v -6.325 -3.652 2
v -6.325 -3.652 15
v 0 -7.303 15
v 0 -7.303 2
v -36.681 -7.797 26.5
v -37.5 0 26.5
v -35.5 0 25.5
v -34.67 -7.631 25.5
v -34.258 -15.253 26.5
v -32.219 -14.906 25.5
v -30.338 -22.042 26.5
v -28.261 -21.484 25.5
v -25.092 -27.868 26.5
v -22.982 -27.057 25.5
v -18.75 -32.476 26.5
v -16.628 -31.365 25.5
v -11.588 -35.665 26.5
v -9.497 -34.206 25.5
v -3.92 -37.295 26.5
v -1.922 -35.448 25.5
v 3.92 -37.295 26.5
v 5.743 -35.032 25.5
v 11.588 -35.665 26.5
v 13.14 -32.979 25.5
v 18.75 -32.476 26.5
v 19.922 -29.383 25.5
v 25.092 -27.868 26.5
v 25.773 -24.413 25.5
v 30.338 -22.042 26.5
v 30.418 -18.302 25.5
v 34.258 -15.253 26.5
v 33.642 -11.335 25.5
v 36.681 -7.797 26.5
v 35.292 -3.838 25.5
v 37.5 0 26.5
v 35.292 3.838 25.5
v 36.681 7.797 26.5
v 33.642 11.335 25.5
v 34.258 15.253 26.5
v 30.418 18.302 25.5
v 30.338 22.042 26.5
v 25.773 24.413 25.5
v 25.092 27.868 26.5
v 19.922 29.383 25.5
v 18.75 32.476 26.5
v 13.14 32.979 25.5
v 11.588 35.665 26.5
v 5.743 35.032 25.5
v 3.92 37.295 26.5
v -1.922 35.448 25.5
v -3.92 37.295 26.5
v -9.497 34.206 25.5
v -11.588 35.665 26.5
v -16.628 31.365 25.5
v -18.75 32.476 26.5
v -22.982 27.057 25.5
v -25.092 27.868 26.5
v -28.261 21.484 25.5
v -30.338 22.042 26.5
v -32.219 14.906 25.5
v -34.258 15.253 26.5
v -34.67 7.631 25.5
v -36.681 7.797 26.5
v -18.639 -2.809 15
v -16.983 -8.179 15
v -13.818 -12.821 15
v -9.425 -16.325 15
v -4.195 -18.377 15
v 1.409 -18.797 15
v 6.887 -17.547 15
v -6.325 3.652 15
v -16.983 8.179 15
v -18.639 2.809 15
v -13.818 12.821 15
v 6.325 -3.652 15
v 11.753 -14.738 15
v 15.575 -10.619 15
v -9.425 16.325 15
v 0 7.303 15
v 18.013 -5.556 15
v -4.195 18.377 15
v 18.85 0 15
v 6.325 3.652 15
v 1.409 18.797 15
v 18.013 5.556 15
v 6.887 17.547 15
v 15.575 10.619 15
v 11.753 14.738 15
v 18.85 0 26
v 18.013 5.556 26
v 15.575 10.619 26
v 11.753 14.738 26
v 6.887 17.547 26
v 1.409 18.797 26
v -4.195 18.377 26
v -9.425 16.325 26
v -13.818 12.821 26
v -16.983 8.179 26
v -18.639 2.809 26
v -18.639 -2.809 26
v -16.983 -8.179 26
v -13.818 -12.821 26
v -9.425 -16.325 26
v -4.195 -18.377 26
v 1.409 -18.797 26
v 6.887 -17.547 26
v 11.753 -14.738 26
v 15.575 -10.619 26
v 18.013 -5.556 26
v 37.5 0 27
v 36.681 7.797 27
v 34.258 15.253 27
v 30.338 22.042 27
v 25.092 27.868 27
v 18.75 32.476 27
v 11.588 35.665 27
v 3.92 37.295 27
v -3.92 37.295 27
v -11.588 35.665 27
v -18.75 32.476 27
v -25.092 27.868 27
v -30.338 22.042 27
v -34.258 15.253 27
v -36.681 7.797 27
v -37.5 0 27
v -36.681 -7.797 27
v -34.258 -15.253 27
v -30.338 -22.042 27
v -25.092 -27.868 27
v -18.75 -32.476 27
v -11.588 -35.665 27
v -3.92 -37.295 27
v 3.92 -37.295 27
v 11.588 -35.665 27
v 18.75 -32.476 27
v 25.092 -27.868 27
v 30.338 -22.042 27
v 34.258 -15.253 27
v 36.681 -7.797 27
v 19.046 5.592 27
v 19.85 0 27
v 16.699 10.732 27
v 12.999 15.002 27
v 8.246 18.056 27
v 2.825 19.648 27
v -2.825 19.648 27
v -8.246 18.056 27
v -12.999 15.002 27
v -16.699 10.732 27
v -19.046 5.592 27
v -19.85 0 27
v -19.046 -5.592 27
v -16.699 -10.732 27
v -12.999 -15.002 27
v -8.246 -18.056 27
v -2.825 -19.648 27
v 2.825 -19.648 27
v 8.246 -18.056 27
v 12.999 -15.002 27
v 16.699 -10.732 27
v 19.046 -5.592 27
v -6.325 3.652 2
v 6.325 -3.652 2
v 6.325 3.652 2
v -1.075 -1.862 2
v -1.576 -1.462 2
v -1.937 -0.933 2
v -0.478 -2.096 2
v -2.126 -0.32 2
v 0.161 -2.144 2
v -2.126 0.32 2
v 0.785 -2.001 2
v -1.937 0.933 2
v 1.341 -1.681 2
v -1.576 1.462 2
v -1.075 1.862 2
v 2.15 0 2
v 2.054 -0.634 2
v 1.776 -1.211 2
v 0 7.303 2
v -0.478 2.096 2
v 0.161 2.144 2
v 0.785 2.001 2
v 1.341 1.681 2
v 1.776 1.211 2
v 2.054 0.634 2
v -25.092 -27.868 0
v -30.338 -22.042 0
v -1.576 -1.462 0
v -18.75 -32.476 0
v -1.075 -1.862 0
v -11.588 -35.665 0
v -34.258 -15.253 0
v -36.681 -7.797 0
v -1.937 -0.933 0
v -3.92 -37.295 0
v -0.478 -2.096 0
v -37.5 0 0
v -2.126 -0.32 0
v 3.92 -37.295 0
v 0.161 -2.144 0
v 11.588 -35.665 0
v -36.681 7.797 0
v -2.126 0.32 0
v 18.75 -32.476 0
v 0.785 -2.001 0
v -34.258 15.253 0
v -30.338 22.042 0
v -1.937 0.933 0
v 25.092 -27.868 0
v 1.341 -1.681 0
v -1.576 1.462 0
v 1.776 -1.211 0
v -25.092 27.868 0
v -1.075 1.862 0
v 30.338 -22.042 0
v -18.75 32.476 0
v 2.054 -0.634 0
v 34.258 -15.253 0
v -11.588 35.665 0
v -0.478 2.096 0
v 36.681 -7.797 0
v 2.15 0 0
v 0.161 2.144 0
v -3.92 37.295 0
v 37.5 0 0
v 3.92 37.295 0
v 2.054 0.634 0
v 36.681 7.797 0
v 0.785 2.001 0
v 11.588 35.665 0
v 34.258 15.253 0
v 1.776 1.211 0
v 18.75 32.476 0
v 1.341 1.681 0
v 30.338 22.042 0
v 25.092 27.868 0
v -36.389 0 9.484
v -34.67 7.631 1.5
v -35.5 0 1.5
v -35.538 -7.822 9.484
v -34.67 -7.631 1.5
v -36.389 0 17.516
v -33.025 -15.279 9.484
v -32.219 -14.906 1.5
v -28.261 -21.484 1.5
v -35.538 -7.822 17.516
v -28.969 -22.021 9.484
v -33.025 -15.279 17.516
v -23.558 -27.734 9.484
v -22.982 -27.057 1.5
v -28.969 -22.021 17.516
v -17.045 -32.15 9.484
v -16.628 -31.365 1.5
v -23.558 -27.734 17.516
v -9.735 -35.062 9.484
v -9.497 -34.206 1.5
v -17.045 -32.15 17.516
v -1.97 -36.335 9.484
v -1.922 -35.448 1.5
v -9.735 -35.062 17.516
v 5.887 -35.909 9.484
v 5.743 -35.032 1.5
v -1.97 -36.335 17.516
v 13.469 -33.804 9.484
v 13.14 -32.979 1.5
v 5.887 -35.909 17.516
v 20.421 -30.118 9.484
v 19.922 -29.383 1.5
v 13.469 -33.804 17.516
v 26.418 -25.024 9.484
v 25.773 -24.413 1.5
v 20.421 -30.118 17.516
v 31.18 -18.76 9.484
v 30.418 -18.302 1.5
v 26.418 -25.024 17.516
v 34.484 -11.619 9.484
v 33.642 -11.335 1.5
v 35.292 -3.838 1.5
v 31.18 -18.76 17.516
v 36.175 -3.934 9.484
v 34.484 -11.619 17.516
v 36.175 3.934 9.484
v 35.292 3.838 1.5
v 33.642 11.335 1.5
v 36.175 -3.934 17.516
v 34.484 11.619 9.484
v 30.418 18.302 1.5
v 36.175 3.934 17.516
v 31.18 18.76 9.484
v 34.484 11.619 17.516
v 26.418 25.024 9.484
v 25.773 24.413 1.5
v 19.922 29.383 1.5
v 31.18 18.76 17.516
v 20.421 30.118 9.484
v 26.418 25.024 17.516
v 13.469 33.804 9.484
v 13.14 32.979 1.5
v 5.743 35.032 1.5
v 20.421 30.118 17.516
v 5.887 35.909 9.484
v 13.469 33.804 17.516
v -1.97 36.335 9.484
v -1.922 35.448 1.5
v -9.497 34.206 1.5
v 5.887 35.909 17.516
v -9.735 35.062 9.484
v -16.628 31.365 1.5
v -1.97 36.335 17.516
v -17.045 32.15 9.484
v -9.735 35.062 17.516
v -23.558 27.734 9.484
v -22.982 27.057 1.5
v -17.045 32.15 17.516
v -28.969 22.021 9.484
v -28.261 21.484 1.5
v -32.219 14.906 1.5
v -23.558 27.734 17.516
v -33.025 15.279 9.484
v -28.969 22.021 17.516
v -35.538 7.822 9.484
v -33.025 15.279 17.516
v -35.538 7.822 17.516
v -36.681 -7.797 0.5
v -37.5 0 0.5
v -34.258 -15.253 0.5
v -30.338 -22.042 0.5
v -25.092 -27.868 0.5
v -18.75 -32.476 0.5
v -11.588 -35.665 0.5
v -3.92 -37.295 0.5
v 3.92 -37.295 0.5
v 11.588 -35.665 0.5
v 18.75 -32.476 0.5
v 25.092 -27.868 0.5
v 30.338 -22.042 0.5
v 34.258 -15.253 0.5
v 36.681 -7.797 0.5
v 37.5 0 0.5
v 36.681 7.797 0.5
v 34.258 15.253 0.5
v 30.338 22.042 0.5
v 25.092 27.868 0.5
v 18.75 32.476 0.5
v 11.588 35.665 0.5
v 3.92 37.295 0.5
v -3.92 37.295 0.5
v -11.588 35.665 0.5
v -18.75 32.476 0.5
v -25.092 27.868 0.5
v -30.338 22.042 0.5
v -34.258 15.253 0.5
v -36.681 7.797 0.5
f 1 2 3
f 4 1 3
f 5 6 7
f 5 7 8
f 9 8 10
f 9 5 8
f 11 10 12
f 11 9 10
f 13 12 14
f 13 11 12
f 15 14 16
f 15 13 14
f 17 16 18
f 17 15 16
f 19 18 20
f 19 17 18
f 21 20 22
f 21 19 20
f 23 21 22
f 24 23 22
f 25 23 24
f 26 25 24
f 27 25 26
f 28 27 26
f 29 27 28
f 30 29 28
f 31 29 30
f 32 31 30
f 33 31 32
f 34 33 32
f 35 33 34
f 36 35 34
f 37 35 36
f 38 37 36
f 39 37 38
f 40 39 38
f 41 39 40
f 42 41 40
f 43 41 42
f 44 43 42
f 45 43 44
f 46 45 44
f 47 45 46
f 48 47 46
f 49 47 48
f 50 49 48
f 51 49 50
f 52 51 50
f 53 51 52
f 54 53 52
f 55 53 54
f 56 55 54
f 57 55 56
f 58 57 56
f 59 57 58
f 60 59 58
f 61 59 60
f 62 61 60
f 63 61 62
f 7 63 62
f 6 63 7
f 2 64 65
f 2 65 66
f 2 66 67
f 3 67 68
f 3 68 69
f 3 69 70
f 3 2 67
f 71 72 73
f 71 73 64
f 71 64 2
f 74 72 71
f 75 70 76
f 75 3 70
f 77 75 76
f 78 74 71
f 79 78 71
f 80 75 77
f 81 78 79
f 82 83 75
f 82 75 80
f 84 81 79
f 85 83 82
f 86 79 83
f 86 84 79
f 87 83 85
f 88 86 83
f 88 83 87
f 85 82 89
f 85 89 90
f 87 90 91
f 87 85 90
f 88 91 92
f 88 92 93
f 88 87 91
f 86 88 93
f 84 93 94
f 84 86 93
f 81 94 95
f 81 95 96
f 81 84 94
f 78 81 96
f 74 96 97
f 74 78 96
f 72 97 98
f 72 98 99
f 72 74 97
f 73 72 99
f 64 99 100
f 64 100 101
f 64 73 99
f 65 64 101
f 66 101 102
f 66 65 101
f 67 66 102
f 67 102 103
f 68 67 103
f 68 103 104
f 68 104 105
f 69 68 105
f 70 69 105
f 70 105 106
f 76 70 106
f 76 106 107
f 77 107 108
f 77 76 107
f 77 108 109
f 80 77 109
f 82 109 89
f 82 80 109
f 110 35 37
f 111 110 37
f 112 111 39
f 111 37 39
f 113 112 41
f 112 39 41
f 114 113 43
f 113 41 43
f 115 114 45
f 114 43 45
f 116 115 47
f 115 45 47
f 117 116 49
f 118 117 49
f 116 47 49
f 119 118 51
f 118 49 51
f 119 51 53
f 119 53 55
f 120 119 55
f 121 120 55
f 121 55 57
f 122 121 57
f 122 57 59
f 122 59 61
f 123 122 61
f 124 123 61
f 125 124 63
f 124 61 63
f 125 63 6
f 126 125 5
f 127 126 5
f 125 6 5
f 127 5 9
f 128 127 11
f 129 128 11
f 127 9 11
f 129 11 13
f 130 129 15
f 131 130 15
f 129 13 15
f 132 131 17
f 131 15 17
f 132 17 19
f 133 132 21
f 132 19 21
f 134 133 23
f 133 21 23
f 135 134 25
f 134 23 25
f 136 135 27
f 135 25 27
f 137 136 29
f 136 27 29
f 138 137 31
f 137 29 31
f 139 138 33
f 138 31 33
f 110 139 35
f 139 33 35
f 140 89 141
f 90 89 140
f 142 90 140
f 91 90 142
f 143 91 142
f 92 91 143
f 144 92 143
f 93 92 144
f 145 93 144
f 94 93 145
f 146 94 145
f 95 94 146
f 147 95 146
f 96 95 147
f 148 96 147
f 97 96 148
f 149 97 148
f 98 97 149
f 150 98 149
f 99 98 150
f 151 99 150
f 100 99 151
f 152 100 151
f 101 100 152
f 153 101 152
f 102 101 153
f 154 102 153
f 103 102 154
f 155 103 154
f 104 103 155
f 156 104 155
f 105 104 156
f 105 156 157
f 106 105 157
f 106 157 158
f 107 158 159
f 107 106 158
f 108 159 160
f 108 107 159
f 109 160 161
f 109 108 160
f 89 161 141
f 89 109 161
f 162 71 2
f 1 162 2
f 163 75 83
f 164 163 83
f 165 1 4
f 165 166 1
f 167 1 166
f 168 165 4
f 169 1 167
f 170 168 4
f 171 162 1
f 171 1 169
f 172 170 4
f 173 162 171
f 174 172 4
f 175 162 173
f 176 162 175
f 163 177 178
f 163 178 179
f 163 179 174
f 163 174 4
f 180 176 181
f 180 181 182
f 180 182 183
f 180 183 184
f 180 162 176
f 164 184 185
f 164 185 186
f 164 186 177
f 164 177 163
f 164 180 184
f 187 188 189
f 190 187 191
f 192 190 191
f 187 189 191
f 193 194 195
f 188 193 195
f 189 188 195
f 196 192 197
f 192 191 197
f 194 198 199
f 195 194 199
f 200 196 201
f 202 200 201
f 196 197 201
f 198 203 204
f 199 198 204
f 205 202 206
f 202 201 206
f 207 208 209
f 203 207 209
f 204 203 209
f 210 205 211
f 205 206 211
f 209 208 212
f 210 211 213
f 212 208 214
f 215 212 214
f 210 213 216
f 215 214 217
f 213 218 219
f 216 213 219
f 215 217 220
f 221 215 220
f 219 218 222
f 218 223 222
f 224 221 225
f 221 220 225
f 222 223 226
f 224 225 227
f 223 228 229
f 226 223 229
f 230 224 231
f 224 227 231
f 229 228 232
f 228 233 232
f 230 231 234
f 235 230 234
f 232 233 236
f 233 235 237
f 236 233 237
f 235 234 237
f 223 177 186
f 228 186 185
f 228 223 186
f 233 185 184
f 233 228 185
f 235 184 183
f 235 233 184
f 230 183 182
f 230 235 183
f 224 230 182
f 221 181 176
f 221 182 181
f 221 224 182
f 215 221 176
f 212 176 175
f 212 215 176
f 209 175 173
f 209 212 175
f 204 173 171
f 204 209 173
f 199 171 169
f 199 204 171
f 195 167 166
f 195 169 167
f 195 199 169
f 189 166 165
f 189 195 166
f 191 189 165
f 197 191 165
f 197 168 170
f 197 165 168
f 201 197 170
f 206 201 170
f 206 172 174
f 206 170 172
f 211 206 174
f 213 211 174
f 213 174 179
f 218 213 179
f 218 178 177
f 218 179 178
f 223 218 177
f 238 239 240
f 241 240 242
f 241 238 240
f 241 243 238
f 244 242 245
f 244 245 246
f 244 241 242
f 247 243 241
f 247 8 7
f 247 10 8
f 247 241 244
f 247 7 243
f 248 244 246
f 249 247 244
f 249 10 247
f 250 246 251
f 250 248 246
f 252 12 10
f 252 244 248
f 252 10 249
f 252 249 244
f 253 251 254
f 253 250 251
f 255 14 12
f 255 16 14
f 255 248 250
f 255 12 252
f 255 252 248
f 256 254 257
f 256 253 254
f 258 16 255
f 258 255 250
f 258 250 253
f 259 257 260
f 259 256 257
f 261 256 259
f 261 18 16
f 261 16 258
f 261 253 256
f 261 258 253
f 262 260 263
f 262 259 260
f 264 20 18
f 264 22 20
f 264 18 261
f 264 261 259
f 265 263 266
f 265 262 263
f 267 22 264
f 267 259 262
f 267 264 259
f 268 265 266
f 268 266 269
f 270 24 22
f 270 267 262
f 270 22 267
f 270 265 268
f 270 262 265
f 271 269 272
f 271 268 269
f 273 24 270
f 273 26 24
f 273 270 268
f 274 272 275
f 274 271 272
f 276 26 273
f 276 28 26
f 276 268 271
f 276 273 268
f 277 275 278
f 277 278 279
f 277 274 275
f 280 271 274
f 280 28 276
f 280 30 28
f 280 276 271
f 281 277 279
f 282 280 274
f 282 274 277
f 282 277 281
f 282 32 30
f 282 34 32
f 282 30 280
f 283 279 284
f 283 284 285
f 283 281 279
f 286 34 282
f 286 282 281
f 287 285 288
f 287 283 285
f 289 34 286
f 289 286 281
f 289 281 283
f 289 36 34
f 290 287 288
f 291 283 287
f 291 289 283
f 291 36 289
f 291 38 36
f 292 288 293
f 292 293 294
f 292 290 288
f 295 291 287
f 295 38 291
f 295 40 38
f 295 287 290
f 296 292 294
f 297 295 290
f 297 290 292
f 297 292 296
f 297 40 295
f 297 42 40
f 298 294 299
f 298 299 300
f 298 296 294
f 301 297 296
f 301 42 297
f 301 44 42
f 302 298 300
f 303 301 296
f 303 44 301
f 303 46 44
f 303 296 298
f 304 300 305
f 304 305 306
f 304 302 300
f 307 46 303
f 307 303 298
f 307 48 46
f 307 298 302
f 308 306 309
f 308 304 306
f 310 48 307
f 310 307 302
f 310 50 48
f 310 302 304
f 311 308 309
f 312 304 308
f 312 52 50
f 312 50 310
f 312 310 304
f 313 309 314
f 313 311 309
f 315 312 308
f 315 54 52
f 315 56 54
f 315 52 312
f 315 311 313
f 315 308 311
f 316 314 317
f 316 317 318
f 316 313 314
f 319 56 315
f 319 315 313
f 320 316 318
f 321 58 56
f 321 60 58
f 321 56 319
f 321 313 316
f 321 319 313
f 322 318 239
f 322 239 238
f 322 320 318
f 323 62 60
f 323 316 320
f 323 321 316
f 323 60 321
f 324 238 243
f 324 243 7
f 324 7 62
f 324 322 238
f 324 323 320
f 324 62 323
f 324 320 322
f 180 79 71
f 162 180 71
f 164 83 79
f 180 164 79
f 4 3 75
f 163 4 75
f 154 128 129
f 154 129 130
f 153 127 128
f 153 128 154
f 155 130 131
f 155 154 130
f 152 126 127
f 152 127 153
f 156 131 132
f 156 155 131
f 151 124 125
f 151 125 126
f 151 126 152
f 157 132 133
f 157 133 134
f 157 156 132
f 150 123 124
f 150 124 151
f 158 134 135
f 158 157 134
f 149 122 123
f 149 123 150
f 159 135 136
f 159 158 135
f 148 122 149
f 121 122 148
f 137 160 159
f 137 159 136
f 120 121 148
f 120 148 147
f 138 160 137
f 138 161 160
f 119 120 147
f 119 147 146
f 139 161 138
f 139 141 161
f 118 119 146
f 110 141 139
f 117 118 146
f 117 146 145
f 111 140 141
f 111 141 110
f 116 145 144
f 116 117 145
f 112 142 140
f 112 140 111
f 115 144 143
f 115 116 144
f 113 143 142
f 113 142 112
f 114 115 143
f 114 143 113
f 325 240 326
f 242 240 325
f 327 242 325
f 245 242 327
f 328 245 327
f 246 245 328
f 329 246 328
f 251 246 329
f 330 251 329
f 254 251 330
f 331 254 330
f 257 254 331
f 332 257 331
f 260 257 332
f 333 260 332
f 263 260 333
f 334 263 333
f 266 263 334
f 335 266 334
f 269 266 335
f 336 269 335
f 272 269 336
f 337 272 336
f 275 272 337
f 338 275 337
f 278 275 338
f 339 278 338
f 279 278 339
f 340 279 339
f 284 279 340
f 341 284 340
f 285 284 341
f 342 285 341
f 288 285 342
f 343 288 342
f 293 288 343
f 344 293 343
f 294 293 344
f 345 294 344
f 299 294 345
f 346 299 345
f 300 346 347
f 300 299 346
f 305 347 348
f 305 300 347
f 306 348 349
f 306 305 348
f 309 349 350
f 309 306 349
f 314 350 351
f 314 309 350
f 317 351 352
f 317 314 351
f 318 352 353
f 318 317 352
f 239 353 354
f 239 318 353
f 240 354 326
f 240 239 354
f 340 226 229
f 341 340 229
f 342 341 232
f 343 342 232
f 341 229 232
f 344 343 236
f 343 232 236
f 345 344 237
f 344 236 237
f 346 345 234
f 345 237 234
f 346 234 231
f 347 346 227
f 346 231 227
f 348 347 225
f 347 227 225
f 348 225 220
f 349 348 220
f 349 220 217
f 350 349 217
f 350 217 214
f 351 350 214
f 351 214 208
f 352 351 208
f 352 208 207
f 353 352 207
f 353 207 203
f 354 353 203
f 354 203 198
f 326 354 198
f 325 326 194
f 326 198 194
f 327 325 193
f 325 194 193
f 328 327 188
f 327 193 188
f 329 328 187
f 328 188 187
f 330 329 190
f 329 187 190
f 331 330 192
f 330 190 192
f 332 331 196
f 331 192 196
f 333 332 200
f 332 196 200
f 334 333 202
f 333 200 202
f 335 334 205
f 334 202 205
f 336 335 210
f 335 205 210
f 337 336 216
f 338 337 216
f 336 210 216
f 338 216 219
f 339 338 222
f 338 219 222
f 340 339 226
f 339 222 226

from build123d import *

# Parameters (mm, degrees)
ESQUISSE1_R             = 37.5
ESQUISSE1_R_2           = 2.15
BOSS_EXTRU_1_DEPTH      = 15
ESQUISSE2_R             = 37.5
ESQUISSE2_R_2           = 18.85
BOSS_EXTRU_2_DEPTH      = 12
ENL_V_MAT_EXTRU_9_DEPTH = 13
CHANFREIN1_SIZE         = 1


with BuildPart() as part:
    # Esquisse1 → Boss.-Extru.1 (new body)
    with BuildSketch(Plane.XY):
        Circle(ESQUISSE1_R)
        Circle(ESQUISSE1_R_2, mode=Mode.SUBTRACT)
    extrude(amount=BOSS_EXTRU_1_DEPTH)

    # Esquisse2 → Boss.-Extru.2 (add)
    with BuildSketch(Plane.XY.offset(15)):
        Circle(ESQUISSE2_R)
        Circle(ESQUISSE2_R_2, mode=Mode.SUBTRACT)
    extrude(amount=BOSS_EXTRU_2_DEPTH)

    # Esquisse9 → Enlèv. mat.-Extru.9 (cut)
    with BuildSketch(Plane.XY.offset(15)):
        Polygon((6.325, -3.651740453), (6.325, 3.651740453), (0, 7.303480905), (-6.325, 3.651740453), (-6.325, -3.651740453), (0, -7.303480905), align=None)
    extrude(amount=-ENL_V_MAT_EXTRU_9_DEPTH, mode=Mode.SUBTRACT)

    # Chanfrein1
    chanfrein1_edges = [part.edges().sort_by_distance(p)[0] for p in [
        (-18.85, 0, 27),
    ]]
    chamfer(chanfrein1_edges, length=CHANFREIN1_SIZE)

    # Esquisse10 → Enlèvement de matière-Révolution1 (revolve, cut)
    with BuildSketch(Plane(origin=(0, 0, 0), x_dir=(0, 0, -1), z_dir=(1, 0, 0)), mode=Mode.PRIVATE) as enl_vement_de_mati_re_r_volution1_sk:
        with BuildLine():
            Line((-26.5, 37.5), (-0.5, 37.5))
            Line((-0.5, 37.5), (-1.5, 35.5))
            ThreePointArc((-1.5, 35.5), (-13.5, 36.5), (-25.5, 35.5))
            Line((-25.5, 35.5), (-26.5, 37.5))
        make_face()
    revolve(enl_vement_de_mati_re_r_volution1_sk.sketch.rotate(Axis((0, 0, 0), (0, 0, 1)), 90), axis=Axis((0, 0, 0), (0, 0, 1)), mode=Mode.SUBTRACT)


solid = part.part
